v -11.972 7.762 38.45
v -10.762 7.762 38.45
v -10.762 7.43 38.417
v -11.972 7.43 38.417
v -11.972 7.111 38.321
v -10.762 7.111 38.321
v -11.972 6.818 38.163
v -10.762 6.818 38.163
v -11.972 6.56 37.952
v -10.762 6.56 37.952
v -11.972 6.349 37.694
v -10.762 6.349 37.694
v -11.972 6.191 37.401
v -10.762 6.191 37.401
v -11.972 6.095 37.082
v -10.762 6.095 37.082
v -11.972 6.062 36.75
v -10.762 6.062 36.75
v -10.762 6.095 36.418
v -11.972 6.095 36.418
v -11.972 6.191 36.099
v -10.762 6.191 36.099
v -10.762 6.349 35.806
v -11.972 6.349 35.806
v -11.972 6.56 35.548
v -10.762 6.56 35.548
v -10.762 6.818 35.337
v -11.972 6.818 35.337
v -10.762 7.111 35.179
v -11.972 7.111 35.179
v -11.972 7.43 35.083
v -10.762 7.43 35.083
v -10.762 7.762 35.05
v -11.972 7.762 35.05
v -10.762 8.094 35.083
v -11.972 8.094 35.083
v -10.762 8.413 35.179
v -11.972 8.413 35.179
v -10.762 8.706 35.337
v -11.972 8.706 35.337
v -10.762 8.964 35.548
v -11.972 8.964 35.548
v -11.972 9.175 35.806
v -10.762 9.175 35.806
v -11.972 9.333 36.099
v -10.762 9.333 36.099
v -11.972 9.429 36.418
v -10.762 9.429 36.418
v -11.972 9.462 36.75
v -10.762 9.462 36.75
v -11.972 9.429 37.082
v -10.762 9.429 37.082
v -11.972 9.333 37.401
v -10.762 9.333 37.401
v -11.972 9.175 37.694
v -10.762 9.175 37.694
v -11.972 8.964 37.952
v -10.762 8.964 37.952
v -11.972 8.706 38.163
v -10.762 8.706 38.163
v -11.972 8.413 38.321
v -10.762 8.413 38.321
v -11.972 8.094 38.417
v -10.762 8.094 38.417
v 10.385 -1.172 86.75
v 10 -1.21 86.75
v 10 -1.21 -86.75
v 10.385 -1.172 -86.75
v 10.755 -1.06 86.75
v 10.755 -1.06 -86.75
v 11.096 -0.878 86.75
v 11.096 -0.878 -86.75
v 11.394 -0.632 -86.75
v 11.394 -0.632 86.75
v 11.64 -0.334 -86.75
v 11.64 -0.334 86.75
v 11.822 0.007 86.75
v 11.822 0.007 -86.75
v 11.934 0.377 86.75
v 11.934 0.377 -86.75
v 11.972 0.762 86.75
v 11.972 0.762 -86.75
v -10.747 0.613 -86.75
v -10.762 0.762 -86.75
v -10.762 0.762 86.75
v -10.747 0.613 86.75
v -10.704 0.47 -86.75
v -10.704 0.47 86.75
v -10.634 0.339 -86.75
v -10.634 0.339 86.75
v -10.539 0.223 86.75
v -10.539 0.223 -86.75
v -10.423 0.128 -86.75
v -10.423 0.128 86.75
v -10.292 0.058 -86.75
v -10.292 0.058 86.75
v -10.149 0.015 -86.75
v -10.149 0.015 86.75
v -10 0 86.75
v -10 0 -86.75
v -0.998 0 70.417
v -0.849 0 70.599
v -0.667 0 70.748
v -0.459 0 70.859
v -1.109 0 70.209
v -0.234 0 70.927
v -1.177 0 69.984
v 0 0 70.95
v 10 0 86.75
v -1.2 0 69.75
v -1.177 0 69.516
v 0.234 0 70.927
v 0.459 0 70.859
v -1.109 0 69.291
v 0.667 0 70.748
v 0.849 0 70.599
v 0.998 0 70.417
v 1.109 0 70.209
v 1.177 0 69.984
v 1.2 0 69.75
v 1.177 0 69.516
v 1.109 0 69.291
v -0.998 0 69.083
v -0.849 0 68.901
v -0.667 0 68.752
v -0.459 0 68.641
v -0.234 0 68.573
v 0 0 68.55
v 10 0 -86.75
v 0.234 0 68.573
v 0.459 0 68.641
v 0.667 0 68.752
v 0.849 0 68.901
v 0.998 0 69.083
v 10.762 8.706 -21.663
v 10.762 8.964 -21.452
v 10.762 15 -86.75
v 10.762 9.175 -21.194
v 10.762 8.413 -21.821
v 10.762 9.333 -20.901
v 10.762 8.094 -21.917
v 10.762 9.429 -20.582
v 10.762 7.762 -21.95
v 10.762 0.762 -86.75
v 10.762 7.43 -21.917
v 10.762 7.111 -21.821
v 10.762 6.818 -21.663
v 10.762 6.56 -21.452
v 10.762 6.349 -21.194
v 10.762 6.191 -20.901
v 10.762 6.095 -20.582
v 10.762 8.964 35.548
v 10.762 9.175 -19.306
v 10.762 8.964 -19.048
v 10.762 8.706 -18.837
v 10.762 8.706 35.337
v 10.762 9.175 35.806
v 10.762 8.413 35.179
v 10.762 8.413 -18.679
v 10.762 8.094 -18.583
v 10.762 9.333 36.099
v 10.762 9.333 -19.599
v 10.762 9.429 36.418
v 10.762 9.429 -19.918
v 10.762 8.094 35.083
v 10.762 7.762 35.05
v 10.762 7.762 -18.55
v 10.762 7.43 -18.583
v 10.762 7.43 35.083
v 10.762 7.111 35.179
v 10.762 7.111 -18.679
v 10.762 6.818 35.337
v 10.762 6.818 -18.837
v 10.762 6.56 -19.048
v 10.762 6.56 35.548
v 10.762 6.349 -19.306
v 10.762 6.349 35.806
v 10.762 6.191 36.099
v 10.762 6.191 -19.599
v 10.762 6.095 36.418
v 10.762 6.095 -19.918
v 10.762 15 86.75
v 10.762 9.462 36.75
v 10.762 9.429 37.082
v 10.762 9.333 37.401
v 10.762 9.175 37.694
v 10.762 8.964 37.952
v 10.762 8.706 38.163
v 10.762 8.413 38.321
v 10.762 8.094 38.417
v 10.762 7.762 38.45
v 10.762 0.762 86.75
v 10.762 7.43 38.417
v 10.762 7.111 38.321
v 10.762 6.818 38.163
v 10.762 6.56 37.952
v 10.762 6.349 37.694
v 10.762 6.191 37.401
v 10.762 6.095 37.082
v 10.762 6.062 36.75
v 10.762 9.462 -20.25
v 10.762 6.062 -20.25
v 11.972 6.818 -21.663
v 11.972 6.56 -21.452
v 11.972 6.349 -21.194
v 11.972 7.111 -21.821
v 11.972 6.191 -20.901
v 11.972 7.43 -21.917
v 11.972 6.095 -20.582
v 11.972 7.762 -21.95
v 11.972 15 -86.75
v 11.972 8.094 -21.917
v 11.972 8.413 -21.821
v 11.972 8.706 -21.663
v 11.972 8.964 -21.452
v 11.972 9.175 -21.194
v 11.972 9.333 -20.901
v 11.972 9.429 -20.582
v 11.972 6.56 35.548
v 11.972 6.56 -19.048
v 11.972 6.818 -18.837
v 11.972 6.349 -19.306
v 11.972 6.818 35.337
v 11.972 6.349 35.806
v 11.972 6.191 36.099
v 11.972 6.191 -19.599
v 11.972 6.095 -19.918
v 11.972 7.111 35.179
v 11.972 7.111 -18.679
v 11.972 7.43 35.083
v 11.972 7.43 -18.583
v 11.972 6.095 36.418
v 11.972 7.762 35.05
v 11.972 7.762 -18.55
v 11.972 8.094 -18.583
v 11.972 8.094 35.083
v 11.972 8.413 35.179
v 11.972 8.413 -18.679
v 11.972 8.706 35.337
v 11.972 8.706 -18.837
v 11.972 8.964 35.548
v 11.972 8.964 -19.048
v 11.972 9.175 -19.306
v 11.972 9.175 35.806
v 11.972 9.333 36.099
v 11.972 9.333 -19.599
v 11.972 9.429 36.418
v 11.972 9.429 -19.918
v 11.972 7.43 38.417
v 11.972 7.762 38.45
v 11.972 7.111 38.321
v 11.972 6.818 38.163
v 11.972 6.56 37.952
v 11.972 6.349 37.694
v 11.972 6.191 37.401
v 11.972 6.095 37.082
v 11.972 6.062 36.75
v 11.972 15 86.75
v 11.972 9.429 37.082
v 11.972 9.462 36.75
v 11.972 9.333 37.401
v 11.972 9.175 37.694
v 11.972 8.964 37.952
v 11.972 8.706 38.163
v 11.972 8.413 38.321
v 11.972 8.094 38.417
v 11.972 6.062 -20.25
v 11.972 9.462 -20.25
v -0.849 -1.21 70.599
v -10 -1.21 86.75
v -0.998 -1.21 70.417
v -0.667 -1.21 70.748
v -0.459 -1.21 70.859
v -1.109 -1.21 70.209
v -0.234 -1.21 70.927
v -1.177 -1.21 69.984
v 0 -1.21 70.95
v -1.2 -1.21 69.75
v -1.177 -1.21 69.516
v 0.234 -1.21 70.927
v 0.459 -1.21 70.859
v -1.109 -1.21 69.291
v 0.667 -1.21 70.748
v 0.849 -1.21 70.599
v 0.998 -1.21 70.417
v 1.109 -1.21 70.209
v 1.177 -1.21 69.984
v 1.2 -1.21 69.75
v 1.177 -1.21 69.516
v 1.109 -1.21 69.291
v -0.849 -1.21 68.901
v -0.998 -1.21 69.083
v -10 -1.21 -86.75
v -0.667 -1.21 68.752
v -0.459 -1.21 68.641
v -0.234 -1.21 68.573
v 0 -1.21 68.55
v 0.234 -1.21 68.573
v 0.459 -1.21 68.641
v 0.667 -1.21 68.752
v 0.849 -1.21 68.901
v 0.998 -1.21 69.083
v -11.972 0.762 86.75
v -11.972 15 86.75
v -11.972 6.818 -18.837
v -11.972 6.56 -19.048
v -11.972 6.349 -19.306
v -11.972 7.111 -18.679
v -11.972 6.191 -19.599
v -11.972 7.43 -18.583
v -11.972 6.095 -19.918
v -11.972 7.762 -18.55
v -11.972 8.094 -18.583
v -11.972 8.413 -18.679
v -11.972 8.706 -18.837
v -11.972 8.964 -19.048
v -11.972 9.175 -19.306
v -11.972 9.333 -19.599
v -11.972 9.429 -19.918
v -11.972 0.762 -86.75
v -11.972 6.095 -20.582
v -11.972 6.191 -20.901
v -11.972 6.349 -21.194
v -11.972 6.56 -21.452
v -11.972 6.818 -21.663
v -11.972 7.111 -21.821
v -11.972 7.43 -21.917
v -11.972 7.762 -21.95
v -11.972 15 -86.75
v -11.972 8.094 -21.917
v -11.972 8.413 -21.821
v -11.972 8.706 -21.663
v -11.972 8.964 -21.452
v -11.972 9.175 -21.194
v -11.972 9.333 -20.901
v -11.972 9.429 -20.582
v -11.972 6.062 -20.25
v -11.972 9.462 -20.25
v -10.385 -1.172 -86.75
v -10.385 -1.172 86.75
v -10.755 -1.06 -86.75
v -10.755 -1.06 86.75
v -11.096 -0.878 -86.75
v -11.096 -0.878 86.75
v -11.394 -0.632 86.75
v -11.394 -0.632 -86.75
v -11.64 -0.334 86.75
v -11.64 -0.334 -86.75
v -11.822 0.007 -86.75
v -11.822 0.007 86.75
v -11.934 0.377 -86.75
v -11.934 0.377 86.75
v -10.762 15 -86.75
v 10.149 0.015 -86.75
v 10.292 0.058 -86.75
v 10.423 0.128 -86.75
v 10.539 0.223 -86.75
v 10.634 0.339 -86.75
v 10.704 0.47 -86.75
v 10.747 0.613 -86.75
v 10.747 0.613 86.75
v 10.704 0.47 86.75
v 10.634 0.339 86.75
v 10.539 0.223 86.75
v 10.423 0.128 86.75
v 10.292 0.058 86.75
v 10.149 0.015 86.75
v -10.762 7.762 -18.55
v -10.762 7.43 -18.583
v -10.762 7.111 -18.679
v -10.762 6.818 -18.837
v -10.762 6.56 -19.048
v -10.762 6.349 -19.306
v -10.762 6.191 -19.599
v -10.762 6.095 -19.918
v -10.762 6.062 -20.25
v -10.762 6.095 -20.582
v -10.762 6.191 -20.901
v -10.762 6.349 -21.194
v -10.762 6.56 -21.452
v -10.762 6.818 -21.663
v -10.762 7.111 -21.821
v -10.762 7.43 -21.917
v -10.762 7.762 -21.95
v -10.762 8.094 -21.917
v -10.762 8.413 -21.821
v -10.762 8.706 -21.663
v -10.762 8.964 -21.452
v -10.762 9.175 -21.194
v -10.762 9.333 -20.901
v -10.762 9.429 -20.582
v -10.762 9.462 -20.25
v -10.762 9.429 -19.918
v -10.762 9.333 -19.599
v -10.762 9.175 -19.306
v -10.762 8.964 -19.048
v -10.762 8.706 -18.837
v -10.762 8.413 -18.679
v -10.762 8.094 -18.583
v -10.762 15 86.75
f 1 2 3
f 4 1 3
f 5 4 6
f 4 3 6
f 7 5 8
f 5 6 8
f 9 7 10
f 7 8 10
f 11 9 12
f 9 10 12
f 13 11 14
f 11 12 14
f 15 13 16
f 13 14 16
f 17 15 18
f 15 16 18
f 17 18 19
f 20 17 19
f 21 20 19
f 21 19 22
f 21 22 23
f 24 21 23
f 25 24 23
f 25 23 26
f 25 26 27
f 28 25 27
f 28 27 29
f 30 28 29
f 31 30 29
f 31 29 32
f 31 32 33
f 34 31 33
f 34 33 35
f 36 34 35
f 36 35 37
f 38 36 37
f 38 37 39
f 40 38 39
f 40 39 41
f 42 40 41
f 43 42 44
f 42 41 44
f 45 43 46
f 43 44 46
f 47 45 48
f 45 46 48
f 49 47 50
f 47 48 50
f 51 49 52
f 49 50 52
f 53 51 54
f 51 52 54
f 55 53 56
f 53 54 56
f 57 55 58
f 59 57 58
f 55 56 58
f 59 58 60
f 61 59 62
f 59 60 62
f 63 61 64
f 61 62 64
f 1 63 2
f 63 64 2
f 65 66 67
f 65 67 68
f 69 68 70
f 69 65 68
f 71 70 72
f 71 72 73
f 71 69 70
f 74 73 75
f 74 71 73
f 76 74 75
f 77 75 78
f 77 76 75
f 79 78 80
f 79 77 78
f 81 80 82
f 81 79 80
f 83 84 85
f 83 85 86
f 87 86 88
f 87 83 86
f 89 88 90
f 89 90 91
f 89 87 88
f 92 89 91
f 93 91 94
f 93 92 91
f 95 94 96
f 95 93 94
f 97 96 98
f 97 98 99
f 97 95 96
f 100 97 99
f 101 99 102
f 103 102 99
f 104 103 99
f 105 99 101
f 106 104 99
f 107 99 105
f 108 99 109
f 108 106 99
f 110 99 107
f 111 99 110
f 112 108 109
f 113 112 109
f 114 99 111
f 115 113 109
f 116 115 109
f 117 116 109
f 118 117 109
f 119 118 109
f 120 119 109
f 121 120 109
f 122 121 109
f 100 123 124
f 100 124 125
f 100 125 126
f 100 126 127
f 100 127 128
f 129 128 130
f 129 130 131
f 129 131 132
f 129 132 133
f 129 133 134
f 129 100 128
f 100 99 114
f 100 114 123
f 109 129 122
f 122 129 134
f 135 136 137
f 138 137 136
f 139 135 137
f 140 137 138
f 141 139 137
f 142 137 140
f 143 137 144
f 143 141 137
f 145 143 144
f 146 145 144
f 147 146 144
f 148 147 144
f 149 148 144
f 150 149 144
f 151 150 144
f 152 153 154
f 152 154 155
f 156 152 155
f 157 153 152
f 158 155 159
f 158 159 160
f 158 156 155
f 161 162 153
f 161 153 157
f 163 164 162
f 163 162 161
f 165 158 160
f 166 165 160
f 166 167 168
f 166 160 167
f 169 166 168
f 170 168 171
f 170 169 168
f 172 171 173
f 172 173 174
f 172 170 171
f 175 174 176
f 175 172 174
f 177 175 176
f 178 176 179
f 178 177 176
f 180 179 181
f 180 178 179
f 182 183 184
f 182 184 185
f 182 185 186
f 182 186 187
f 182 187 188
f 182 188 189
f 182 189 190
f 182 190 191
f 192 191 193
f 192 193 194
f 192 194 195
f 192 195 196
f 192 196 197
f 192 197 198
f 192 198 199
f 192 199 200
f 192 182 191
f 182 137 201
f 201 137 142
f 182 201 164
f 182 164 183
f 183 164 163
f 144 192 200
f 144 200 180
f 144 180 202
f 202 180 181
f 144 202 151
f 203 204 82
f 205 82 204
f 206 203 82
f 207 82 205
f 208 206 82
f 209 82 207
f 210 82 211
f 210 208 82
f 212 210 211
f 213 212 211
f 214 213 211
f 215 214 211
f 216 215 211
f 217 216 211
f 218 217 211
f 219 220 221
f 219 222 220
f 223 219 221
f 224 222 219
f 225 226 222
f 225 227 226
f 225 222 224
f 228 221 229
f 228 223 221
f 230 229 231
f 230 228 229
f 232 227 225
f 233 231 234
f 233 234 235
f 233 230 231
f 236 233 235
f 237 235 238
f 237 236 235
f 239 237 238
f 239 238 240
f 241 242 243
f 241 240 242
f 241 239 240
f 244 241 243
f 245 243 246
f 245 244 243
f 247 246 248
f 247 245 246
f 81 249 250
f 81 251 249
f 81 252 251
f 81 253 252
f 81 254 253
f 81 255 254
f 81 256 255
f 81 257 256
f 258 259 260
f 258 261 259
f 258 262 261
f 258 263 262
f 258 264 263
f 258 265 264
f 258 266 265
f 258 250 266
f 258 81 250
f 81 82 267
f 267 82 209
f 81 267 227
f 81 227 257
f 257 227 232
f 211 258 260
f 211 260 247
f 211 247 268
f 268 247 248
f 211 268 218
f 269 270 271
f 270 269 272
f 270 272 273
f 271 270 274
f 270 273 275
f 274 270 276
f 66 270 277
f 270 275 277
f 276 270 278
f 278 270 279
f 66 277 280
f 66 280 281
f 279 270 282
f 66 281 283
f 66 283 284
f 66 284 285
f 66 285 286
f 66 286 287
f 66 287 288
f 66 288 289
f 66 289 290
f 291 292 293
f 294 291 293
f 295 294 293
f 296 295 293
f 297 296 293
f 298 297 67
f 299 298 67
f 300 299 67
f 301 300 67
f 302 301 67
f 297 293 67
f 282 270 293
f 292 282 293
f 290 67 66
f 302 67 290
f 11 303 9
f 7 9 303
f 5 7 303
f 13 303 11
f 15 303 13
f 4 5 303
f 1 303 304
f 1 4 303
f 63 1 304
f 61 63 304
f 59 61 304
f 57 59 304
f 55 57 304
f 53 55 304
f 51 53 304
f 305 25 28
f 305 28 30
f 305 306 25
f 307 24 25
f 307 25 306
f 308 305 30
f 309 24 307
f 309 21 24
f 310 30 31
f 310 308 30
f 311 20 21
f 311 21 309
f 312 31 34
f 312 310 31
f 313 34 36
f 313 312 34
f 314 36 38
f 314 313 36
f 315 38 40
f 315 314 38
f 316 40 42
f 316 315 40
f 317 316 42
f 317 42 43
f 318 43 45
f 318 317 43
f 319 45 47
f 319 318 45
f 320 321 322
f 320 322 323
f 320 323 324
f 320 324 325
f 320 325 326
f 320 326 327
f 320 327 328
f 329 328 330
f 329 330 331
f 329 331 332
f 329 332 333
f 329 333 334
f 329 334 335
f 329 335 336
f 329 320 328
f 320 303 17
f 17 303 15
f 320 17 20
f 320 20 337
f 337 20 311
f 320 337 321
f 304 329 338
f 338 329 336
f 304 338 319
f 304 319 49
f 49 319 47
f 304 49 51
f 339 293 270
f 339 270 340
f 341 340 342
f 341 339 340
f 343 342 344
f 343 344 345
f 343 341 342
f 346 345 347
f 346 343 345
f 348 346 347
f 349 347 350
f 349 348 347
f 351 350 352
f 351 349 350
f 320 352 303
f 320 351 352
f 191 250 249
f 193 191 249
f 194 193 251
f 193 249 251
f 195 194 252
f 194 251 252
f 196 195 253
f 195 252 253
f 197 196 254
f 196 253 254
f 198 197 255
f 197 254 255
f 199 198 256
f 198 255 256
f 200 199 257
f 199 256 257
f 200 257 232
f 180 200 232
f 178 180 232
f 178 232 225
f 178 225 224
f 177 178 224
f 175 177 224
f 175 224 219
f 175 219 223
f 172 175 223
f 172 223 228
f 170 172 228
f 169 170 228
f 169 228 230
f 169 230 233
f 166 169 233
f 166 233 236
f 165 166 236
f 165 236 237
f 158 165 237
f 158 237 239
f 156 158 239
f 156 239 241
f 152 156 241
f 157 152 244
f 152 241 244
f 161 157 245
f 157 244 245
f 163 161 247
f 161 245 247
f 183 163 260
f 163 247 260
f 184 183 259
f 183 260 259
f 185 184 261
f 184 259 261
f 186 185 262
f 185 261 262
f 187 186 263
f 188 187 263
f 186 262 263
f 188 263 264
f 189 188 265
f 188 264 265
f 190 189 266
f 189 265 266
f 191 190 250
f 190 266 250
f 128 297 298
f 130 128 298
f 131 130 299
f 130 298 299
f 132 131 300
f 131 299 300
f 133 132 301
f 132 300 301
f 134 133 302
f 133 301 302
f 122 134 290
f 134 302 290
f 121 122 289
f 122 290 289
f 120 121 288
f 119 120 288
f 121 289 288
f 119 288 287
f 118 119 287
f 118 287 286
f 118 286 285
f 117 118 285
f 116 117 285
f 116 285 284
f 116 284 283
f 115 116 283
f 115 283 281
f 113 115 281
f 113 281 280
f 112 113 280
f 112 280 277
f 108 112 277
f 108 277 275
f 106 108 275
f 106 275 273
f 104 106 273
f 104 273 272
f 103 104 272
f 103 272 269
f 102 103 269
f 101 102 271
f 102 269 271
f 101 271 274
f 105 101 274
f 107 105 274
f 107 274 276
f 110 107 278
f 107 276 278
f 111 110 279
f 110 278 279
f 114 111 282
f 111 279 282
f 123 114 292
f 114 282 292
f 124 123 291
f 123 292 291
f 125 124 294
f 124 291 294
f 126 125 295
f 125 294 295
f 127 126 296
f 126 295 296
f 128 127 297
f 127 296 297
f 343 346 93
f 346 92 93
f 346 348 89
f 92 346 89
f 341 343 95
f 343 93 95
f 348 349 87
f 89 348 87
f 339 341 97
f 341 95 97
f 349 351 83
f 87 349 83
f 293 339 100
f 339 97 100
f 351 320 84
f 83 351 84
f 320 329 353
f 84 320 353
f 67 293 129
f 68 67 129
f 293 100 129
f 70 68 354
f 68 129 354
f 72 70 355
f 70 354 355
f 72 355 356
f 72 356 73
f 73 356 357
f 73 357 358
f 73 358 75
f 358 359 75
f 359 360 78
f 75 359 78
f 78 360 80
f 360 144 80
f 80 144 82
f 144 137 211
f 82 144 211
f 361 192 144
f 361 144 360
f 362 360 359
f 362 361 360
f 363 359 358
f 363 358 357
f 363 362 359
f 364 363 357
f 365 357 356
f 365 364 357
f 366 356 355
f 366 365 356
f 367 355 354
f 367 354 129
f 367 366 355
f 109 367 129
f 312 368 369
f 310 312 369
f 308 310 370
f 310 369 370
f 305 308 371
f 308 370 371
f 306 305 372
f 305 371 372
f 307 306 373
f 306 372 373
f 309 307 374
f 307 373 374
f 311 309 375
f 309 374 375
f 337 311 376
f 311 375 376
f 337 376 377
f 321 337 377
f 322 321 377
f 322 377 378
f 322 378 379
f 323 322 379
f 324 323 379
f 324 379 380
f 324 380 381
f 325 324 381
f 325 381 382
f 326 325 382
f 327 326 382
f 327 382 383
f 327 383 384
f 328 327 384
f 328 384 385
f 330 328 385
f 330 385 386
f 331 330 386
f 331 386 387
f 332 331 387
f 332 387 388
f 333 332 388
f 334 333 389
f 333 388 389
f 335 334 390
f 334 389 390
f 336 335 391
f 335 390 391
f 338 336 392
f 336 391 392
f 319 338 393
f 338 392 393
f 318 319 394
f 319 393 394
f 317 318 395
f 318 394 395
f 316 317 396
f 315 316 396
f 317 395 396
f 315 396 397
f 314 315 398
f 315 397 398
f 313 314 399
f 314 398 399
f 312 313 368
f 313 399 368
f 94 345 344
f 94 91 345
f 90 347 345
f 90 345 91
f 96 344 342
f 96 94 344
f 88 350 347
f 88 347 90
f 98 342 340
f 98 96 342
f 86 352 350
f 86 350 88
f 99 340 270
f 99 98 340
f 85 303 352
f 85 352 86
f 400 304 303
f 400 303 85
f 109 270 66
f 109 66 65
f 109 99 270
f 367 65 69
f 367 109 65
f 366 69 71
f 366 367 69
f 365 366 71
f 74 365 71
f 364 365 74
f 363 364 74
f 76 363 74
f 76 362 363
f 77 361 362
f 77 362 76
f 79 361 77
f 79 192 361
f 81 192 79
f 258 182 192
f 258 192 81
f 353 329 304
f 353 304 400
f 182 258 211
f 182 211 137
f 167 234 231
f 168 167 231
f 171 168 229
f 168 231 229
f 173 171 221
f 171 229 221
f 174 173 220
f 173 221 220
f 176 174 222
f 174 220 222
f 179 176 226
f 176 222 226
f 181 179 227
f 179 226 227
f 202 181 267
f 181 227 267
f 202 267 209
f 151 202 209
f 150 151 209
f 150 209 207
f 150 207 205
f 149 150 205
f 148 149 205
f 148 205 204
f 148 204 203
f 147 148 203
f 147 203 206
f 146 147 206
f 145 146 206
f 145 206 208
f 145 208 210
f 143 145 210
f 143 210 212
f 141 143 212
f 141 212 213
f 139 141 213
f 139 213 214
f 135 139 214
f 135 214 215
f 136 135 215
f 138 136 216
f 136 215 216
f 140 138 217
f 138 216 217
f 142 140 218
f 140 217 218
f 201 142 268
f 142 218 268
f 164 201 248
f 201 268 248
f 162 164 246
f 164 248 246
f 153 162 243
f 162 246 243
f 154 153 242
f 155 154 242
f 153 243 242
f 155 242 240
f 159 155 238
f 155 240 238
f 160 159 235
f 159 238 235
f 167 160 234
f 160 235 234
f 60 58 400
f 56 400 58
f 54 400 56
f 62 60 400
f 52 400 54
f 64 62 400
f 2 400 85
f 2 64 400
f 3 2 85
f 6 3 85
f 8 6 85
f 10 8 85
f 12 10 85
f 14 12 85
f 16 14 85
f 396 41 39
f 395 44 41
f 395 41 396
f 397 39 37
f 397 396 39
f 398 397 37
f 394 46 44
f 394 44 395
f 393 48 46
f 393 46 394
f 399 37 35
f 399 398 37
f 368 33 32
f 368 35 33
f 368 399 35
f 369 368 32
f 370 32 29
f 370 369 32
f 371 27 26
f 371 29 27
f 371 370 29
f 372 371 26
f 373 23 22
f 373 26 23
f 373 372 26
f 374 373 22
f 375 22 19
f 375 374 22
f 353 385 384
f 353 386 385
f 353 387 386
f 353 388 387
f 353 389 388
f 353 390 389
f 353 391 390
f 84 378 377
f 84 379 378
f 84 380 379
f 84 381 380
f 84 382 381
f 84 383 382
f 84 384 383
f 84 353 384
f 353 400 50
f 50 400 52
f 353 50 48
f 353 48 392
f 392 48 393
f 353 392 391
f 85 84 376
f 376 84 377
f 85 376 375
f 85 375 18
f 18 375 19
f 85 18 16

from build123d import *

# Parameters (mm, degrees)
SKETCH1_W            = 20
SKETCH1_H            = 173.5
BASE_FLANGE1_DEPTH   = 1.21
EDGE_FLANGE1_DEPTH   = 173.5
EDGE_FLANGE2_DEPTH   = 173.5
SKETCH14_R           = 1.2
CUT_EXTRUDE1_DEPTH   = 5
M3_CLEARANCE_HOLE1_D = 3.4


# Sheet-metal steps are written as plain solids
with BuildPart() as part:
    # Sketch1 → Base-Flange1 (new body)
    with BuildSketch(Plane(origin=(0, 0, 0), x_dir=(1, 0, 0), z_dir=(0, 1, 0))):
        Rectangle(SKETCH1_W, SKETCH1_H)
    extrude(amount=-BASE_FLANGE1_DEPTH)

    # Edge-Flange1 section (across the edge) → Edge-Flange1 (add)
    with BuildSketch(Plane(origin=(-10.762, 0, -86.75), x_dir=(1, 0, 0), z_dir=(0, 0, 1))):
        with BuildLine():
            Line((-1.21, 0.762), (-1.21, 15))
            Line((-1.21, 15), (0, 15))
            Line((0, 15), (0, 0.762))
            ThreePointArc((0, 0.762), (0.223184633, 0.223184633), (0.762, 0))
            Line((0.762, 0), (0.762, -1.21))
            ThreePointArc((0.762, -1.21), (-0.632414572, -0.632414572), (-1.21, 0.762))
        make_face()
    extrude(amount=EDGE_FLANGE1_DEPTH)

    # Edge-Flange2 section (across the edge) → Edge-Flange2 (add)
    with BuildSketch(Plane(origin=(10.762, 0, 86.75), x_dir=(-1, 0, 0), z_dir=(0, 0, -1))):
        with BuildLine():
            Line((-1.21, 0.762), (-1.21, 15))
            Line((-1.21, 15), (0, 15))
            Line((0, 15), (0, 0.762))
            ThreePointArc((0, 0.762), (0.223184633, 0.223184633), (0.762, 0))
            Line((0.762, 0), (0.762, -1.21))
            ThreePointArc((0.762, -1.21), (-0.632414572, -0.632414572), (-1.21, 0.762))
        make_face()
    extrude(amount=EDGE_FLANGE2_DEPTH)

    # Sketch14 → Cut-Extrude1 (cut)
    with BuildSketch(Plane(origin=(0, -1.21, 0), x_dir=(-1, 0, 0), z_dir=(0, -1, 0))):
        with Locations(Location((0, -69.75, 0), (0, 0, 90))):
            Circle(SKETCH14_R)
    extrude(amount=-CUT_EXTRUDE1_DEPTH, mode=Mode.SUBTRACT)

    # M3 Clearance Hole1 (through all)
    with Locations(Plane(origin=(-11.972, 85.70162808, 15.202320986), x_dir=(0, 0, -1), z_dir=(-1, 0, 0))):
        with Locations((-21.547679014, 77.93962808), (35.452320986, 77.93962808)):
            Hole(M3_CLEARANCE_HOLE1_D / 2)


solid = part.part
